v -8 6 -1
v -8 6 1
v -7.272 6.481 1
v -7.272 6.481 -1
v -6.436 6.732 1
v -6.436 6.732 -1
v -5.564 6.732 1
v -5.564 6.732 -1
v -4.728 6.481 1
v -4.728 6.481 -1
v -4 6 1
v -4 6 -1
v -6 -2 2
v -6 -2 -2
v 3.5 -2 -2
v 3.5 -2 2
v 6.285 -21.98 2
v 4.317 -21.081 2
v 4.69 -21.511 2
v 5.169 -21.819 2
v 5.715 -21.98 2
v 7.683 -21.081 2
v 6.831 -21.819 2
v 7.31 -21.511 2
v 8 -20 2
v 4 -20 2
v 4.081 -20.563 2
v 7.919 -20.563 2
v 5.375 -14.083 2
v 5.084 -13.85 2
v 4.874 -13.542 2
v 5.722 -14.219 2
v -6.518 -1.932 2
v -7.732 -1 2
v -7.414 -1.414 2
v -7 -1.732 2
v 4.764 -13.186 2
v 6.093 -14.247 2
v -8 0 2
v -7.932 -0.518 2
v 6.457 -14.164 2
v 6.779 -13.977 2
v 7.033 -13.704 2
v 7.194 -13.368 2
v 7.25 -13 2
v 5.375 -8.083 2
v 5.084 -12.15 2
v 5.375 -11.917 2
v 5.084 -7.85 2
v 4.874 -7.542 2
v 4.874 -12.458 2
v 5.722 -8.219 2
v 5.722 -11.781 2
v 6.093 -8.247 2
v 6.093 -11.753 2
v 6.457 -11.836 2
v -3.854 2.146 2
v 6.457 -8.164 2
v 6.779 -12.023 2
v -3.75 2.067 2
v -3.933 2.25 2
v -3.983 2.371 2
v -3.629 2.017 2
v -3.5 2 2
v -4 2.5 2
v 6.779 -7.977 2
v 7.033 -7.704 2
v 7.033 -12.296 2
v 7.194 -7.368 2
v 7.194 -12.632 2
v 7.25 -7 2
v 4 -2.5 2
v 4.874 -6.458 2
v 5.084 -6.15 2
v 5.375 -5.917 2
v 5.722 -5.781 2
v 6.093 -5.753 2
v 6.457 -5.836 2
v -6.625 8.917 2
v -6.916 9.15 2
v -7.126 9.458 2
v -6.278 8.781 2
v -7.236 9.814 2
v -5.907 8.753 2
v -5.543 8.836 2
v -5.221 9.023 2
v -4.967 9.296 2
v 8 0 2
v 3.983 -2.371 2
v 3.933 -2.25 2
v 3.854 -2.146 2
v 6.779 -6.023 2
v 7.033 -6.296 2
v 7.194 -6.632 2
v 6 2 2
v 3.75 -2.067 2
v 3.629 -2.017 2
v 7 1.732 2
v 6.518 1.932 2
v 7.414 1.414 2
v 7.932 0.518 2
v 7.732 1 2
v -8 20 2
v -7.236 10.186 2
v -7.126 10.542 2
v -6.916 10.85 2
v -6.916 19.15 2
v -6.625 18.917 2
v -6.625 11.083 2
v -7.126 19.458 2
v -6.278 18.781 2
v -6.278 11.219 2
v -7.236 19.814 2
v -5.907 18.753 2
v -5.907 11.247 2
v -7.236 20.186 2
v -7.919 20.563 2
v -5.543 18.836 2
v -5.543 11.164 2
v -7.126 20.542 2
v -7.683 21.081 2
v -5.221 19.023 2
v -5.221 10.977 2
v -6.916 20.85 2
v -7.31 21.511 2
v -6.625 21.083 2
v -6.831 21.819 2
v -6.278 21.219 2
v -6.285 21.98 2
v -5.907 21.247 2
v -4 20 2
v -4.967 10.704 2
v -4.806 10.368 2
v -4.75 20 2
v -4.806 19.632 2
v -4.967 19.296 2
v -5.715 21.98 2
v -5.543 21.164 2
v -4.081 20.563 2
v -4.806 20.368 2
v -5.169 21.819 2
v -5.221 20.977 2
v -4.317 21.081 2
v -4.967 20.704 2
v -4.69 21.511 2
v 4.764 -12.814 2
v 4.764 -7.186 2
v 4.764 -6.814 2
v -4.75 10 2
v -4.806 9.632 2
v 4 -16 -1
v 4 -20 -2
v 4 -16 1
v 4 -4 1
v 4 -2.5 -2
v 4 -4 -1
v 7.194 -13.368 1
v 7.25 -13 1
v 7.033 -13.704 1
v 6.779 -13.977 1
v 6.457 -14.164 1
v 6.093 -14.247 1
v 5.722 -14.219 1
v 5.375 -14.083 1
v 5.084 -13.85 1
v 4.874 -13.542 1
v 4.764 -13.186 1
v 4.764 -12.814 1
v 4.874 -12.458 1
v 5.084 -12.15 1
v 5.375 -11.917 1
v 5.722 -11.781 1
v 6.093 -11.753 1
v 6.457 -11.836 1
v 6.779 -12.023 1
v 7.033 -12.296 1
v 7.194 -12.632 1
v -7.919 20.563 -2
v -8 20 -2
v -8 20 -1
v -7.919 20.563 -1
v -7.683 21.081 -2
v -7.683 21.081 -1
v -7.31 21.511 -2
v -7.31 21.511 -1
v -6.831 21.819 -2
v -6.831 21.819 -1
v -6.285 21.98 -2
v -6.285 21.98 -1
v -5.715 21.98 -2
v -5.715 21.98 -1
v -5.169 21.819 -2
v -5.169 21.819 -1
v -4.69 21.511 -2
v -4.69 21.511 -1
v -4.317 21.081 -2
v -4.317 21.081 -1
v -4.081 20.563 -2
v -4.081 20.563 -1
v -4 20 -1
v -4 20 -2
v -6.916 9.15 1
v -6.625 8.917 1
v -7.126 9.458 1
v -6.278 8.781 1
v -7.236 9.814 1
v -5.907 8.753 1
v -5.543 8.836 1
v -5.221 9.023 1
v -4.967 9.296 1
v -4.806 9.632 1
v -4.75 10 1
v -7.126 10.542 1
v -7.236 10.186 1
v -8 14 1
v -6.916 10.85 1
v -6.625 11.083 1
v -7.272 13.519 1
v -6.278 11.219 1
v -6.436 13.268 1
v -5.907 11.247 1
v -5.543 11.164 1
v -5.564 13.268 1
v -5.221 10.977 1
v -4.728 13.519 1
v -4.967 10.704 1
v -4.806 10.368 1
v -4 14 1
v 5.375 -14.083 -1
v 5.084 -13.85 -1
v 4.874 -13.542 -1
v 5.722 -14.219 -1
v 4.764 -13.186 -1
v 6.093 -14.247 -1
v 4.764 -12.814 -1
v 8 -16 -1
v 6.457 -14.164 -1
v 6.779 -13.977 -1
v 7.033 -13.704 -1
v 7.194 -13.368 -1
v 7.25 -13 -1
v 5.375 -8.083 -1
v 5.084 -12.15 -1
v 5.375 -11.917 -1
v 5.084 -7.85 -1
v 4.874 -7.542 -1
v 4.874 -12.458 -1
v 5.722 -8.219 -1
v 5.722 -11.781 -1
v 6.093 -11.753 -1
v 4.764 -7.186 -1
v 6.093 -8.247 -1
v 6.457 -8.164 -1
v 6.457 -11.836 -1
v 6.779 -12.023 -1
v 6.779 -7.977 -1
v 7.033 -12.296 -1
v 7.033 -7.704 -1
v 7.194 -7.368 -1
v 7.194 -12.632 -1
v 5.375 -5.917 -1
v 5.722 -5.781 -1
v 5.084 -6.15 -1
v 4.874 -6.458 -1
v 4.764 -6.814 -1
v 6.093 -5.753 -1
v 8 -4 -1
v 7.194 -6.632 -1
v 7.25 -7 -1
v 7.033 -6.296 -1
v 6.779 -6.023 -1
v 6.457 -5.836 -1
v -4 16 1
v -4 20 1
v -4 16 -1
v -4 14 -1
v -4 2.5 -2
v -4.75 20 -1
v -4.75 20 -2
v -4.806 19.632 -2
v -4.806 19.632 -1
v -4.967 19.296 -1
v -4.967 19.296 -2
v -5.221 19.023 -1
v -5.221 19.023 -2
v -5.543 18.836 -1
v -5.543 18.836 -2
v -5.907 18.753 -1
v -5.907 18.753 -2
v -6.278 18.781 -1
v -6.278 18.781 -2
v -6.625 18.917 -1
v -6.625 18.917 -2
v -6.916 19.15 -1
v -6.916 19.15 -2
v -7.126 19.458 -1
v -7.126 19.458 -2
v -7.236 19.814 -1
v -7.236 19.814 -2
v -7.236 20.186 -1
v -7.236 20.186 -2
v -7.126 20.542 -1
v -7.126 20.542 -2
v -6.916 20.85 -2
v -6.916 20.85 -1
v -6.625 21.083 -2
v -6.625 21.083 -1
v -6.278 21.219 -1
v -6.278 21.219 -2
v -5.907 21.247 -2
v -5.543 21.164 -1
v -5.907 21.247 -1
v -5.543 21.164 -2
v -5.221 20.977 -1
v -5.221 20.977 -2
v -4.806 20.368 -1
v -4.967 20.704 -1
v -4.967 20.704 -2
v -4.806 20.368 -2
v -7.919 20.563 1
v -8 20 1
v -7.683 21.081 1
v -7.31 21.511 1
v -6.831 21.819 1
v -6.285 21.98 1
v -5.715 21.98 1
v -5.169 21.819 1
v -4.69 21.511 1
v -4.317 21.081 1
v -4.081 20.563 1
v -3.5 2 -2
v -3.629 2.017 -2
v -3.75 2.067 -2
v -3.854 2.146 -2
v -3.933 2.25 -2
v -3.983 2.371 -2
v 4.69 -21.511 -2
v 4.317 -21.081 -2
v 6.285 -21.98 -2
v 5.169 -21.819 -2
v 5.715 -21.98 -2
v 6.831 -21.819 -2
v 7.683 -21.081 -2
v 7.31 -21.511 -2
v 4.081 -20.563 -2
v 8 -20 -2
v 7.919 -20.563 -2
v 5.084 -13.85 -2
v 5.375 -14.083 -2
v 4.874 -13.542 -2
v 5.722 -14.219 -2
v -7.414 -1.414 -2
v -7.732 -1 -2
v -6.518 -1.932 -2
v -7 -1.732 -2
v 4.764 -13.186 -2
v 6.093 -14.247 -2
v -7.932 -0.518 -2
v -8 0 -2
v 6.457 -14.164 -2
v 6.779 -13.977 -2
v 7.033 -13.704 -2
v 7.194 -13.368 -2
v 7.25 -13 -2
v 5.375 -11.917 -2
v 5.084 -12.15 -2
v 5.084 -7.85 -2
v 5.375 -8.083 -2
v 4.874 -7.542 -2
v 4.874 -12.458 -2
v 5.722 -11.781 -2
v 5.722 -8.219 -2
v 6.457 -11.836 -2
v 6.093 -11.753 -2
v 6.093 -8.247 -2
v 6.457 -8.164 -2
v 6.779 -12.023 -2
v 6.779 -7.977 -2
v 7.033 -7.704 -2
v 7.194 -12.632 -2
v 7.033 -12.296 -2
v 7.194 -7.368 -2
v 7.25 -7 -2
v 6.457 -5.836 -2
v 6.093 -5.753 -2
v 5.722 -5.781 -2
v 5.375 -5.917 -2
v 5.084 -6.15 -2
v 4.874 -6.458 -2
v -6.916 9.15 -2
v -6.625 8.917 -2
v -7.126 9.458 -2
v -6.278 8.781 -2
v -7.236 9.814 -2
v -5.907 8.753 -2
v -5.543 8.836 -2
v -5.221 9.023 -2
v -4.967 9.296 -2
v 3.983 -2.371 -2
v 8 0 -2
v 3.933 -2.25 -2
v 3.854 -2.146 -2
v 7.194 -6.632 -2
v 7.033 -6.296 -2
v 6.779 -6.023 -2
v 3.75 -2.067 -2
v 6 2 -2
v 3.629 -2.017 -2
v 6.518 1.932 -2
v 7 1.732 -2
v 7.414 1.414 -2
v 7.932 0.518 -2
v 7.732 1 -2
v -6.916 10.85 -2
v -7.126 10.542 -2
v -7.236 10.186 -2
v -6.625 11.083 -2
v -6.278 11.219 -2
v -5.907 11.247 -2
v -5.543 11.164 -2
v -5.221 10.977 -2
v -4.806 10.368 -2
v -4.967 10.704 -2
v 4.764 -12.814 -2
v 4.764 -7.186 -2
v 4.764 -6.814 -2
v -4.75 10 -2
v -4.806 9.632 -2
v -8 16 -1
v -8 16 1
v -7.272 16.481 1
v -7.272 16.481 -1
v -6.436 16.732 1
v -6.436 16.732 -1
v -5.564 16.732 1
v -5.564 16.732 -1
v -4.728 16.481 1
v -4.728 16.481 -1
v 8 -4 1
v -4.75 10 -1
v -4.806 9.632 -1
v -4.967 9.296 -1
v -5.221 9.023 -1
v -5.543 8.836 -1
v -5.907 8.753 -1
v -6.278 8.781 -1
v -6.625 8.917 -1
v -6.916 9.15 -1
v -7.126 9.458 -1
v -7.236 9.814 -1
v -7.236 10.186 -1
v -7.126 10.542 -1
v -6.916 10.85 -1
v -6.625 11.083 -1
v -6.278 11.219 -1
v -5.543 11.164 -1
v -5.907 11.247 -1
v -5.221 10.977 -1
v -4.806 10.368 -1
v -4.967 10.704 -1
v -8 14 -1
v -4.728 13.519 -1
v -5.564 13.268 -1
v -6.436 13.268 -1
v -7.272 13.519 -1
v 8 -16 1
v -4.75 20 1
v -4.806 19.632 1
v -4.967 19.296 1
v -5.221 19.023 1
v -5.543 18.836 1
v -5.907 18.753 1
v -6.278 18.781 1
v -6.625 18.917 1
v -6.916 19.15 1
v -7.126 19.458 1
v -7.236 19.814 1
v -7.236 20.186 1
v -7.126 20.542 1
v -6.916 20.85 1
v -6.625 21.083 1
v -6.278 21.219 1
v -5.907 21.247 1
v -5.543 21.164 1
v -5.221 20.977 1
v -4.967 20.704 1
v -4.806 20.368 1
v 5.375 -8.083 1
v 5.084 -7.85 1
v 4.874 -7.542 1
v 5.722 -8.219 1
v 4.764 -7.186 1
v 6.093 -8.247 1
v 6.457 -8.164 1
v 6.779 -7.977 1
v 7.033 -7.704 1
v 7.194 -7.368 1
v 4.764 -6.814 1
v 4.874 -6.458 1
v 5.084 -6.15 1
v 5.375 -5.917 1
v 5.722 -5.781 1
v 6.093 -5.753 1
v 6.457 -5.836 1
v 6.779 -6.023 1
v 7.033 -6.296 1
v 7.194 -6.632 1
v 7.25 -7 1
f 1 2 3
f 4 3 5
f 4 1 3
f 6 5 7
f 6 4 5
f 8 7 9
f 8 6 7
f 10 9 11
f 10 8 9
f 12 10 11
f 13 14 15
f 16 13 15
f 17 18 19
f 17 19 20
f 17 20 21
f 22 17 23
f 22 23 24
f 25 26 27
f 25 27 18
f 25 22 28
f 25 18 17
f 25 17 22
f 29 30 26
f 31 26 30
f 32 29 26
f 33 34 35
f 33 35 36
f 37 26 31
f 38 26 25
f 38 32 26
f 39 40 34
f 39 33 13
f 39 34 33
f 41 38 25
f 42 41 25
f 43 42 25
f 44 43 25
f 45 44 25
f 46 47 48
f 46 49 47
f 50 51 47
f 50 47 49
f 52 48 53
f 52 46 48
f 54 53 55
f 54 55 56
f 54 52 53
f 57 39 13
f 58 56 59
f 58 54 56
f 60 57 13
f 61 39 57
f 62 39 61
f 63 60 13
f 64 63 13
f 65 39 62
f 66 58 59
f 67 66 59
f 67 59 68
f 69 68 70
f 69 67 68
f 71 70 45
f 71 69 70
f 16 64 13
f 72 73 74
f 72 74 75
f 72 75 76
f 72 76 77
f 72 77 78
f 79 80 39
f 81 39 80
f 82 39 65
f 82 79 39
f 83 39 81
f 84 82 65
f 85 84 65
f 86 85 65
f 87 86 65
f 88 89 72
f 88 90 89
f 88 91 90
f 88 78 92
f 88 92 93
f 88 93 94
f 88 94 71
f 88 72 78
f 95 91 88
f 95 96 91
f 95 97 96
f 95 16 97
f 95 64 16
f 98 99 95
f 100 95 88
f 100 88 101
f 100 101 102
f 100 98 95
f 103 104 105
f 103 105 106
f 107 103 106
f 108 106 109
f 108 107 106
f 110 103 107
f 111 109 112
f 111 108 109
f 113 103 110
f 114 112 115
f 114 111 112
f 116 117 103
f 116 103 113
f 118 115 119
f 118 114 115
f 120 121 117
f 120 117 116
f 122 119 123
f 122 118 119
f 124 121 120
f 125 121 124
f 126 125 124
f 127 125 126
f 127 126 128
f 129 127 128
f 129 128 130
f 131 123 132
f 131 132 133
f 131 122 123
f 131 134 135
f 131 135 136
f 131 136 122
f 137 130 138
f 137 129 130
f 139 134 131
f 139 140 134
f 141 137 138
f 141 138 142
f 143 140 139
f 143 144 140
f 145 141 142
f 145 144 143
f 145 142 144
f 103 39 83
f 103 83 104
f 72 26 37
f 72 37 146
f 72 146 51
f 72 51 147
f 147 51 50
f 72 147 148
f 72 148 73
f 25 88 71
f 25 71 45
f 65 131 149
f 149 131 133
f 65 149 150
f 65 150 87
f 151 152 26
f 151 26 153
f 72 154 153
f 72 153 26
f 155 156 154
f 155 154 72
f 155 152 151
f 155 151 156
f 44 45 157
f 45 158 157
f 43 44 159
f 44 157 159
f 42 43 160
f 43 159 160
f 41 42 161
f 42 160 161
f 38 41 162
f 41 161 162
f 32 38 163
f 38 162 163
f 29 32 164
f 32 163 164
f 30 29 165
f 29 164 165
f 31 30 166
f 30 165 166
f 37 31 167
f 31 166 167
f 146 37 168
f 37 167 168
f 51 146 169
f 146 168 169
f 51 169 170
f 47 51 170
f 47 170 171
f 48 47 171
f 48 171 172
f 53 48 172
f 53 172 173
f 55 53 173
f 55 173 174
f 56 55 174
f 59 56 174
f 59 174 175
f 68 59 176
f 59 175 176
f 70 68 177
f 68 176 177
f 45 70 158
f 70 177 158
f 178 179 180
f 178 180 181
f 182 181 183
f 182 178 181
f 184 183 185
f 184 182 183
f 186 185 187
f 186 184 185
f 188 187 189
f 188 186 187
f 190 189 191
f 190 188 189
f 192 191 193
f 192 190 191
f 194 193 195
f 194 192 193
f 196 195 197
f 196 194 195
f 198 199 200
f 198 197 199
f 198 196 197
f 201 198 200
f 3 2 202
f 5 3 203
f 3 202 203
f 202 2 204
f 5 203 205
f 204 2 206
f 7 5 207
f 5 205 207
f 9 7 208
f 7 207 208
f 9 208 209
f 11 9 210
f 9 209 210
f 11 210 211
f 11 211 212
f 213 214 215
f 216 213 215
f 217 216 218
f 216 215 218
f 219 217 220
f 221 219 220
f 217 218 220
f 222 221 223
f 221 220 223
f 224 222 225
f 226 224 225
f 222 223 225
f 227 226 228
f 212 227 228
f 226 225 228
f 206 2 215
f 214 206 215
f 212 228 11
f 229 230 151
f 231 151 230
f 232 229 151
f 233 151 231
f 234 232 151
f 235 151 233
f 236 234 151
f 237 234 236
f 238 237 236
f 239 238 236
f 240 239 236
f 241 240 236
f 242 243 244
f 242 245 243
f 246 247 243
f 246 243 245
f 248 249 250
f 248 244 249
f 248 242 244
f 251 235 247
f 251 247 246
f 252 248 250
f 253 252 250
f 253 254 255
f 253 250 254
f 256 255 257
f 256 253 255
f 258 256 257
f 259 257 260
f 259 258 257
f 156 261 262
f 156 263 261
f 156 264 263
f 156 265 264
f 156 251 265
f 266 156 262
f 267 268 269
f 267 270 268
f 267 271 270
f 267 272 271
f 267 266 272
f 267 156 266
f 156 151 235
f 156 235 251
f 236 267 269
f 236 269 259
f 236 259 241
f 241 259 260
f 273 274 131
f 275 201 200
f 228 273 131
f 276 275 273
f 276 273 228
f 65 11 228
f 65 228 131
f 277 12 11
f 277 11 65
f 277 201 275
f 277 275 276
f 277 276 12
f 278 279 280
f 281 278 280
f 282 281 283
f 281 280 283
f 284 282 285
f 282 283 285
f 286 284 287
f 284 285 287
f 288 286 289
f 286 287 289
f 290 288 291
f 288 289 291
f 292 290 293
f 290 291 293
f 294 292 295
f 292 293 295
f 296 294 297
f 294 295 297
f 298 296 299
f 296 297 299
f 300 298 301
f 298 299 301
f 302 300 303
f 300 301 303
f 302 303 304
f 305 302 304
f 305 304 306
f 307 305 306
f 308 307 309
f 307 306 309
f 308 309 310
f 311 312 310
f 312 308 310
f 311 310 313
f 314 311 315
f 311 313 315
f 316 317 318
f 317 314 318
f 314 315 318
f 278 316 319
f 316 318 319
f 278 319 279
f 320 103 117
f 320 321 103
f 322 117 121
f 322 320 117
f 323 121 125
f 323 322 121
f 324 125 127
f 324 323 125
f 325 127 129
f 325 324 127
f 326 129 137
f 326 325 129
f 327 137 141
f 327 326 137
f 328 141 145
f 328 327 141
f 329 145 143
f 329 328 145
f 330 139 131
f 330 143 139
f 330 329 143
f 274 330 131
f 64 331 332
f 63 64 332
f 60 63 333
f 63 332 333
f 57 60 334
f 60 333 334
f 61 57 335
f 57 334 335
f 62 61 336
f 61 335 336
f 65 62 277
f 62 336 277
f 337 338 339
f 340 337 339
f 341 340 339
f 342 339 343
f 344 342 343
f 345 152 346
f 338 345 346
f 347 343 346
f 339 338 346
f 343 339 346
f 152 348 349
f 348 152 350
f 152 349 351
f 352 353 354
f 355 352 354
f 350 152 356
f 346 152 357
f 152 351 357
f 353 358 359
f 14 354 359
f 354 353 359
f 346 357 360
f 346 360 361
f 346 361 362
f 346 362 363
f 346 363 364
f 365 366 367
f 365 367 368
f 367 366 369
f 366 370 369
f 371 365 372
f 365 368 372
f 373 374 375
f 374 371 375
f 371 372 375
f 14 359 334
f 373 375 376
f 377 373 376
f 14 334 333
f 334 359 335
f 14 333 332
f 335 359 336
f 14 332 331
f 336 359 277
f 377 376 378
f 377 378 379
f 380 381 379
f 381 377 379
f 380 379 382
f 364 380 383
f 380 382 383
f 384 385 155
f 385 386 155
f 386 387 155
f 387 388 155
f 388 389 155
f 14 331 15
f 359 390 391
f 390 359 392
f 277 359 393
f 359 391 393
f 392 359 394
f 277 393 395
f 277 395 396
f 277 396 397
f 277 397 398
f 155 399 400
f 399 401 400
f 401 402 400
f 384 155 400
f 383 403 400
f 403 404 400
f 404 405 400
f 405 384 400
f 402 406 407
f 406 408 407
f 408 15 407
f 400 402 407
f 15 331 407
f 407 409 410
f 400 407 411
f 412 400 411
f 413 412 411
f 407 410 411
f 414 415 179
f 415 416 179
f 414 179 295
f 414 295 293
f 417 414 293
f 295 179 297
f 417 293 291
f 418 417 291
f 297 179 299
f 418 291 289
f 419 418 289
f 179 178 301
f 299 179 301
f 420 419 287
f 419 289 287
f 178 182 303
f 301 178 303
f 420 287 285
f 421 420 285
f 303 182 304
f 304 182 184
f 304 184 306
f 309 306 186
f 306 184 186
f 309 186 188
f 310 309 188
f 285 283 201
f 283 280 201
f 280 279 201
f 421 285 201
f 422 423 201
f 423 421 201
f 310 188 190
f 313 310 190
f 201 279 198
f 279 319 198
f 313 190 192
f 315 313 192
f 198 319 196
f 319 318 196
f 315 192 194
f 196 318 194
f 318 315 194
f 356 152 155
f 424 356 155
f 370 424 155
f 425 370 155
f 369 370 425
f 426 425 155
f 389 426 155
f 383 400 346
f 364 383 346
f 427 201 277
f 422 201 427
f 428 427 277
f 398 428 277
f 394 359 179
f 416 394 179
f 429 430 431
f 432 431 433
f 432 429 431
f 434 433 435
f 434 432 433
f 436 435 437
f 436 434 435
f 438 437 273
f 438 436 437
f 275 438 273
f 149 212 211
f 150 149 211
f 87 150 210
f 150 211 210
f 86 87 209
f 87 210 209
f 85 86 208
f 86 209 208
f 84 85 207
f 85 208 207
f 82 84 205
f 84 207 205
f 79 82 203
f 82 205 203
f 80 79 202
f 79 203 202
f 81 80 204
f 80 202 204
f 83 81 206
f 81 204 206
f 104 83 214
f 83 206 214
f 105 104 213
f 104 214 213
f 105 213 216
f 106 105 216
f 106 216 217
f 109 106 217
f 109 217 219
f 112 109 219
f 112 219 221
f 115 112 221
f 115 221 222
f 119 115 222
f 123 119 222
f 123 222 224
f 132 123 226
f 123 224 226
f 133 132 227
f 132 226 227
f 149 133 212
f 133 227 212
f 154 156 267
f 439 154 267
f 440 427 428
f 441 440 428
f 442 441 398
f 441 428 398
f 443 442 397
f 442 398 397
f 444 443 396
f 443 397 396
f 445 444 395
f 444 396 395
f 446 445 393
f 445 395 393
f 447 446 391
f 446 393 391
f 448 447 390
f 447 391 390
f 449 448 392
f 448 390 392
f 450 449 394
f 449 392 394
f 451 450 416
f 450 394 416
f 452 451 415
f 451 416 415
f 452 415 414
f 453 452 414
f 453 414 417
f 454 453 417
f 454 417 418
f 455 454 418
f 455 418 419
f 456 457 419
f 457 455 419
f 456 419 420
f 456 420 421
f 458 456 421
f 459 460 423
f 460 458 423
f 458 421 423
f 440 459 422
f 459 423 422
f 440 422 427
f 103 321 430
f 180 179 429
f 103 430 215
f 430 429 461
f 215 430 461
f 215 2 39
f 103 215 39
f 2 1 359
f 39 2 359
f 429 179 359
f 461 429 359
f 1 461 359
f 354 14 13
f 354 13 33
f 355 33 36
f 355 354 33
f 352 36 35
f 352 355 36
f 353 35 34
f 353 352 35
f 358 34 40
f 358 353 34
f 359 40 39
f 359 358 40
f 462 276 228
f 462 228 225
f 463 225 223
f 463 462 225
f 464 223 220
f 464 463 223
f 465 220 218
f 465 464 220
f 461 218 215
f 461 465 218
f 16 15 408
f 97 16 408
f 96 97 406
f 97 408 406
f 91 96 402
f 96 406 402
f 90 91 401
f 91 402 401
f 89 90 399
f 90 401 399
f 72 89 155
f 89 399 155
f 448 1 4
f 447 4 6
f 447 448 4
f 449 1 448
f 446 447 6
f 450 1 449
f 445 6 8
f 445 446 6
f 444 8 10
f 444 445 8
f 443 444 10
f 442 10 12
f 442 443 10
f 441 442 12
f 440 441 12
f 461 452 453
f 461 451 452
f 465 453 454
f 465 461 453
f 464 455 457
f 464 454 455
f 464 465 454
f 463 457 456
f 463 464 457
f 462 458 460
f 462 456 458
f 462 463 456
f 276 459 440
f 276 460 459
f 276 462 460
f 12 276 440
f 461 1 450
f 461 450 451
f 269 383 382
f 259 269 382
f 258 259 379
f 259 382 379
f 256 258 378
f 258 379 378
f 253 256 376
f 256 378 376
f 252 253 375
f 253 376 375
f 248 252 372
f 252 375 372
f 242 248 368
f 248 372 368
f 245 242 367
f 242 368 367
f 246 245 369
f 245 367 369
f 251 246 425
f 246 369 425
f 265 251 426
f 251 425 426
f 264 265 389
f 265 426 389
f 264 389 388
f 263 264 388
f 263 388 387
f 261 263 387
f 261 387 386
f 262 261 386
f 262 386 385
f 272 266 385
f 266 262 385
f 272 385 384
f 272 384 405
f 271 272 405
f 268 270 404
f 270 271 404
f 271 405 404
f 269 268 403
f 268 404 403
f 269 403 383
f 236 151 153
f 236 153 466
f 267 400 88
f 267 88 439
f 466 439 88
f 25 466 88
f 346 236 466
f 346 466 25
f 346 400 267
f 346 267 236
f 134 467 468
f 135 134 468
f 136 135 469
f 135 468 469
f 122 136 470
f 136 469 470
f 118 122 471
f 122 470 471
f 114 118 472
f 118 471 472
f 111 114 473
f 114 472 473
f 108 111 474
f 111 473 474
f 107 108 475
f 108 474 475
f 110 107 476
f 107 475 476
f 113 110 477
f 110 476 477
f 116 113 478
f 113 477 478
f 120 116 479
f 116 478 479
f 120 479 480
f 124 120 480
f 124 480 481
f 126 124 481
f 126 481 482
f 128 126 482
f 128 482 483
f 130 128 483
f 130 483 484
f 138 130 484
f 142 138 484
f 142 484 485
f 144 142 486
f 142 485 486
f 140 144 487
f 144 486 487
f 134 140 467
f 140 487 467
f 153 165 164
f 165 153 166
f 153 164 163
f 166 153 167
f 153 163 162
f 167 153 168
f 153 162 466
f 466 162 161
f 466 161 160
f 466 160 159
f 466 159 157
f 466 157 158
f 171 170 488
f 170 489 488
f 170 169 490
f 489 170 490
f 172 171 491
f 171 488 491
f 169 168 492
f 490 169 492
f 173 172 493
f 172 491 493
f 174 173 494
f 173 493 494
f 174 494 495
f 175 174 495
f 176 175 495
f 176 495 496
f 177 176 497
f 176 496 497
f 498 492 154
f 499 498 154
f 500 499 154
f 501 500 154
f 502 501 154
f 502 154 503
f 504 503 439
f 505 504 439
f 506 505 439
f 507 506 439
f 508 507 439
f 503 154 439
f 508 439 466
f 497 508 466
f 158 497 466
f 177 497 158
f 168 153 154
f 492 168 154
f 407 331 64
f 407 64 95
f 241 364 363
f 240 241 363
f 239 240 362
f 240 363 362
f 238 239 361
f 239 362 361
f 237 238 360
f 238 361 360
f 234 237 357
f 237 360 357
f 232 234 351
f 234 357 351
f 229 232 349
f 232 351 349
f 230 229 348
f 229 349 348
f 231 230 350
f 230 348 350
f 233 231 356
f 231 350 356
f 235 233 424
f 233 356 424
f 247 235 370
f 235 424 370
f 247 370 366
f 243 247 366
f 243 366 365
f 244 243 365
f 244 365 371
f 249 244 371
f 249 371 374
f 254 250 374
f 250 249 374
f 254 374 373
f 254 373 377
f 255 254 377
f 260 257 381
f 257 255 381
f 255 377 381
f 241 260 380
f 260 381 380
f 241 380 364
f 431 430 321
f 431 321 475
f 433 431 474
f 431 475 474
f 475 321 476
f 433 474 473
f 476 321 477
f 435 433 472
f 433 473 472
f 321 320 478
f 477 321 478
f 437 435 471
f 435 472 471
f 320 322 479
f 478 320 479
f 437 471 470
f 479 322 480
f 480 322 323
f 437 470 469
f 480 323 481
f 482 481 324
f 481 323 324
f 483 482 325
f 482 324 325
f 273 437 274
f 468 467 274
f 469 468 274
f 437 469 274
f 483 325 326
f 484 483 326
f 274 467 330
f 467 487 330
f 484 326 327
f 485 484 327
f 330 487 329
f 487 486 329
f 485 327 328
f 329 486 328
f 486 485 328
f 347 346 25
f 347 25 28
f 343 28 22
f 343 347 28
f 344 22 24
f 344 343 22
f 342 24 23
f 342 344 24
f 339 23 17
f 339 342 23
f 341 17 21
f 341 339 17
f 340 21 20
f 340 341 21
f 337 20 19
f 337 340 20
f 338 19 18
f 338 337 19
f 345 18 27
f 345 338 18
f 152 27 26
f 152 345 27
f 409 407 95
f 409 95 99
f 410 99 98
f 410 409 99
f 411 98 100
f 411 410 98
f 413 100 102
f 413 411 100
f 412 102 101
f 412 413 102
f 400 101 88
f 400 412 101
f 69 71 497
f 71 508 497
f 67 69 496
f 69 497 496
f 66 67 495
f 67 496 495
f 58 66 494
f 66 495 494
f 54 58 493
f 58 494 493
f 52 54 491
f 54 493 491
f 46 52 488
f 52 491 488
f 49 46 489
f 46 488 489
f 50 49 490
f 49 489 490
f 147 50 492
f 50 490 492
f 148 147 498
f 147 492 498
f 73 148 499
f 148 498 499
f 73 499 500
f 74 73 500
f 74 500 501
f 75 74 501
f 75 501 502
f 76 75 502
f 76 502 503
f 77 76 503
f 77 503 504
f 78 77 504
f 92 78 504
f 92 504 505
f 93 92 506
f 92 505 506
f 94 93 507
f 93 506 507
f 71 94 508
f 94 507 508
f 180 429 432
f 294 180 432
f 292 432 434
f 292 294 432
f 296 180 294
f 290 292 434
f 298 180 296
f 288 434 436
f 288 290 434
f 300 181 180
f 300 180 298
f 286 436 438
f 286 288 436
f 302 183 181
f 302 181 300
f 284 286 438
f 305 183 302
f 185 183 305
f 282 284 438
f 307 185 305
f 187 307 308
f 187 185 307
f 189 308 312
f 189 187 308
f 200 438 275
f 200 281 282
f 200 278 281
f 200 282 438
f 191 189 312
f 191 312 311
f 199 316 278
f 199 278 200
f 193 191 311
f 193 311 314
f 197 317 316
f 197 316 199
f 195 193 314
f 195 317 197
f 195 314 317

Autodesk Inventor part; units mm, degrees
ref_plane "YZ Plane" through (0, 0, 0) normal (1, 0, 0) x (0, 1, 0)
ref_plane "XZ Plane" through (0, 0, 0) normal (0, 1, 0) x (-1, 0, 0)
ref_plane "XY Plane" through (0, 0, 0) normal (0, 0, 1) x (1, 0, 0)
sketch "Sketch1" plane through (0, 0, 0) normal (0, 0, 1) x (1, 0, 0)
  line L0 (0, 0) -> (6, 0)
  line L1 (6, 0) -> (6, -20)
  line L2 (0, 0) -> (-6, 0)
  line L3 (-6, 0) -> (-6, 20)
  circle A0 centre (-6, 20) radius 2
  circle A1 centre (-6, 20) radius 1.25
  line L4 (-6, 0) -> (-6, 10)
  circle A2 centre (-6, 10) radius 1.25
  circle A3 centre (6, 0) radius 2
  circle A4 centre (-6, 0) radius 2
  line L5 (-8, 20) -> (-8, 0)
  line L6 (-4, 20) -> (-4, 2.5)
  line L7 (-6, -2) -> (3.5, -2)
  line L8 (-3.5, 2) -> (6, 2)
  circle A5 centre (6, -20) radius 2
  line L9 (4, -20) -> (4, -2.5)
  line L10 (8, 0) -> (8, -20)
  arc A6 (-4, 2.5) -> (-3.5, 2) centre (-3.5, 2.5) ccw
  arc A7 (4, -2.5) -> (3.5, -2) centre (3.5, -2.5) ccw
  line L11 (-8, 20) -> (-4, 20)
  line L12 (-4, 20) -> (-4, 16)
  line L13 (-4, 16) -> (-8, 16)
  line L14 (-8, 16) -> (-8, 20)
  arc A8 (-4, 16) -> (-8, 16) centre (-6, 13.7639) ccw
  line L15 (-4, 10) -> (-8, 10)
  line L16 (-8, 10) -> (-8, 14)
  line L17 (-8, 14) -> (-4, 14)
  line L18 (-4, 14) -> (-4, 10)
  line L19 (-4, 10) -> (-8, 10)
  line L20 (-8, 10) -> (-8, 6)
  line L21 (-8, 6) -> (-4, 6)
  line L22 (-4, 6) -> (-4, 10)
  arc A9 (-8, 14) -> (-4, 14) centre (-6, 16.2361) ccw
  arc A10 (-4, 6) -> (-8, 6) centre (-6, 3.7639) ccw
  line L23 (6, 0) -> (6, -7)
  circle A11 centre (6, -7) radius 1.25
  line L24 (6, -20) -> (6, -13)
  circle A12 centre (6, -13) radius 1.25
  line L25 (4, -6.5) -> (4, -3.5)
  line L26 (8, -3.5) -> (8, -6.5)
  line L27 (4, -13.5) -> (4, -16.5)
  line L28 (8, -16.5) -> (8, -13.5)
  line L29 (8, -7) -> (4, -7)
  line L30 (4, -7) -> (4, -4)
  line L31 (4, -4) -> (8, -4)
  line L32 (8, -4) -> (8, -7)
  line L33 (8, -13) -> (4, -13)
  line L34 (4, -13) -> (4, -16)
  line L35 (4, -16) -> (8, -16)
  line L36 (8, -16) -> (8, -13)
  point P0 (-4, 0)
  point P1 (6, -2)
  point P2 (-6, 2)
  point P3 (6, 2)
  point P4 (4, 0)
  point P5 (-4, 6)
  point P6 (-4, 14)
  point P7 (-8, 16)
  point P8 (4, -4)
  point P9 (4, -16)
  point P10 (8, -16)
  dimension "d44" = 6
  dimension "d45" = 20
  dimension "d46" = 6
  dimension "d47" = 20
  dimension "d48" = 4
  dimension "d49" = 2.5
  dimension "d50" = 10
  dimension "d51" = 2.5
  dimension "d52" = 4
  dimension "d53" = 4
  dimension "d54" = 4
  dimension "d55" = 0.5
  dimension "d56" = 0.5
  dimension "d57" = 4
  dimension "d58" = 20
  dimension "d59" = 3
  dimension "d60" = 4
  dimension "d61" = 10
  dimension "d62" = 4
  dimension "d63" = 3
  dimension "d64" = 3
  dimension "d66" = 2.5
  dimension "d68" = 2.5
  dimension "d75" = 7
  dimension "d77" = 7
  dimension "d78" = 3
  dimension "d79" = 3
extrude "Extrusion8" add sketch "Sketch1" along normal mid plane 4 contours L2 A4 L3 L21 L6 A6 L8 A3 L0 | L0 A3 L1 L31 L9 A7 L7 A4 L2 | A3 L1 L0 | L0 L1 A3 | A4 L3 L2 | L2 L3 A4 | A3 L10 L31 L1 | A4 L5 L21 L3 | L31 L10 L29 A11 L1 | L1 A11 L29 L9 L31 | L21 A10 L3 | L3 A10 L21 | L5 L15 A2 L3 A10 | L3 A2 L15 L6 A10 | L29 L10 L33 A12 L1 A11 | A11 L1 A12 L33 L9 L29 | L5 A9 L3 A2 L15 | L15 A2 L3 A9 L6 | L5 L13 L3 L17 | L17 L3 A9 | L17 L3 L13 L6 | A9 L3 L17 | L10 L35 L1 A12 L33 | L33 A12 L1 L35 L9 | A8 L3 L13 | L5 A0 L3 A8 | A8 L3 A0 L6 | L13 L3 A8 | L11 A1 L3 A0 | A0 L11 A1 | A0 L3 A1 L11 | L10 A5 L1 L35 | L35 L1 A5 L9 | A5
extrude "Extrusion9" cut sketch "Sketch1" along normal mid plane 2 contours L31 L10 L29 A11 L1 | L1 A11 L29 L9 L31 | L5 L15 A2 L3 A10 | L3 A2 L15 L6 A10 | L29 L10 L33 A12 L1 A11 | A11 L1 A12 L33 L9 L29 | L5 A9 L3 A2 L15 | L15 A2 L3 A9 L6 | L10 L35 L1 A12 L33 | L33 A12 L1 L35 L9 | L5 A0 L3 A8 | A8 L3 A0 L6 | L11 A1 L3 A0 | A0 L11 A1 | A0 L3 A1 L11
properties part number "link7" material "Aluminum 6061"
